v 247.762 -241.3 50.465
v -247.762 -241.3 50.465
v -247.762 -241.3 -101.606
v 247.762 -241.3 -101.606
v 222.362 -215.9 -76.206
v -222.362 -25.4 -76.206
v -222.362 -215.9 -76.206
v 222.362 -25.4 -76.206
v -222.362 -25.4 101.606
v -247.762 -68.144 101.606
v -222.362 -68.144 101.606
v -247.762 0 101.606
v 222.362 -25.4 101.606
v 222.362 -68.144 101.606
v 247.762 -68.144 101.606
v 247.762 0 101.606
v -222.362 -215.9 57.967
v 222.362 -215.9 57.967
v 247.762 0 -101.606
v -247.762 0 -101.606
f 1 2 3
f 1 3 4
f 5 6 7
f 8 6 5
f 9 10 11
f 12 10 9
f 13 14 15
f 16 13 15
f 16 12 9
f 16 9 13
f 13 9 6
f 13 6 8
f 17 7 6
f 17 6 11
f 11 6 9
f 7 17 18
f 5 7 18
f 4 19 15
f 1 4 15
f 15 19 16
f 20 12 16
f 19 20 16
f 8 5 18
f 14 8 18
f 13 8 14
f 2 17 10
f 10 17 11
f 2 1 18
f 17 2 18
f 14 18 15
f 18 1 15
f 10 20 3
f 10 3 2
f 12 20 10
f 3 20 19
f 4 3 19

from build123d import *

# Parameters (mm, degrees)
F0_W     = 495.524884
F0_H     = 203.211292
F1_DEPTH = 241.3
F2_T     = -25.4
F4_DEPTH = 495.554


with BuildPart() as f1:
    # F0 (on Front) → F1 (new body)
    with BuildSketch(Plane.XZ):
        Rectangle(F0_W, F0_H)
    extrude(amount=F1_DEPTH)

    # F2
    f2_openings = [f1.faces().sort_by_distance(p)[0] for p in [
        (0, -120.65, 101.605646),
    ]]
    offset(amount=F2_T, openings=f2_openings)

    # F3 (on face) → F4 (cut)
    with BuildSketch(Plane.YZ.offset(247.762442)):
        Polygon((-68.14377, 101.605646), (-241.3, 101.605646), (-241.3, 50.465446), align=None)
    extrude(amount=-F4_DEPTH, mode=Mode.SUBTRACT)


solid = f1.part
